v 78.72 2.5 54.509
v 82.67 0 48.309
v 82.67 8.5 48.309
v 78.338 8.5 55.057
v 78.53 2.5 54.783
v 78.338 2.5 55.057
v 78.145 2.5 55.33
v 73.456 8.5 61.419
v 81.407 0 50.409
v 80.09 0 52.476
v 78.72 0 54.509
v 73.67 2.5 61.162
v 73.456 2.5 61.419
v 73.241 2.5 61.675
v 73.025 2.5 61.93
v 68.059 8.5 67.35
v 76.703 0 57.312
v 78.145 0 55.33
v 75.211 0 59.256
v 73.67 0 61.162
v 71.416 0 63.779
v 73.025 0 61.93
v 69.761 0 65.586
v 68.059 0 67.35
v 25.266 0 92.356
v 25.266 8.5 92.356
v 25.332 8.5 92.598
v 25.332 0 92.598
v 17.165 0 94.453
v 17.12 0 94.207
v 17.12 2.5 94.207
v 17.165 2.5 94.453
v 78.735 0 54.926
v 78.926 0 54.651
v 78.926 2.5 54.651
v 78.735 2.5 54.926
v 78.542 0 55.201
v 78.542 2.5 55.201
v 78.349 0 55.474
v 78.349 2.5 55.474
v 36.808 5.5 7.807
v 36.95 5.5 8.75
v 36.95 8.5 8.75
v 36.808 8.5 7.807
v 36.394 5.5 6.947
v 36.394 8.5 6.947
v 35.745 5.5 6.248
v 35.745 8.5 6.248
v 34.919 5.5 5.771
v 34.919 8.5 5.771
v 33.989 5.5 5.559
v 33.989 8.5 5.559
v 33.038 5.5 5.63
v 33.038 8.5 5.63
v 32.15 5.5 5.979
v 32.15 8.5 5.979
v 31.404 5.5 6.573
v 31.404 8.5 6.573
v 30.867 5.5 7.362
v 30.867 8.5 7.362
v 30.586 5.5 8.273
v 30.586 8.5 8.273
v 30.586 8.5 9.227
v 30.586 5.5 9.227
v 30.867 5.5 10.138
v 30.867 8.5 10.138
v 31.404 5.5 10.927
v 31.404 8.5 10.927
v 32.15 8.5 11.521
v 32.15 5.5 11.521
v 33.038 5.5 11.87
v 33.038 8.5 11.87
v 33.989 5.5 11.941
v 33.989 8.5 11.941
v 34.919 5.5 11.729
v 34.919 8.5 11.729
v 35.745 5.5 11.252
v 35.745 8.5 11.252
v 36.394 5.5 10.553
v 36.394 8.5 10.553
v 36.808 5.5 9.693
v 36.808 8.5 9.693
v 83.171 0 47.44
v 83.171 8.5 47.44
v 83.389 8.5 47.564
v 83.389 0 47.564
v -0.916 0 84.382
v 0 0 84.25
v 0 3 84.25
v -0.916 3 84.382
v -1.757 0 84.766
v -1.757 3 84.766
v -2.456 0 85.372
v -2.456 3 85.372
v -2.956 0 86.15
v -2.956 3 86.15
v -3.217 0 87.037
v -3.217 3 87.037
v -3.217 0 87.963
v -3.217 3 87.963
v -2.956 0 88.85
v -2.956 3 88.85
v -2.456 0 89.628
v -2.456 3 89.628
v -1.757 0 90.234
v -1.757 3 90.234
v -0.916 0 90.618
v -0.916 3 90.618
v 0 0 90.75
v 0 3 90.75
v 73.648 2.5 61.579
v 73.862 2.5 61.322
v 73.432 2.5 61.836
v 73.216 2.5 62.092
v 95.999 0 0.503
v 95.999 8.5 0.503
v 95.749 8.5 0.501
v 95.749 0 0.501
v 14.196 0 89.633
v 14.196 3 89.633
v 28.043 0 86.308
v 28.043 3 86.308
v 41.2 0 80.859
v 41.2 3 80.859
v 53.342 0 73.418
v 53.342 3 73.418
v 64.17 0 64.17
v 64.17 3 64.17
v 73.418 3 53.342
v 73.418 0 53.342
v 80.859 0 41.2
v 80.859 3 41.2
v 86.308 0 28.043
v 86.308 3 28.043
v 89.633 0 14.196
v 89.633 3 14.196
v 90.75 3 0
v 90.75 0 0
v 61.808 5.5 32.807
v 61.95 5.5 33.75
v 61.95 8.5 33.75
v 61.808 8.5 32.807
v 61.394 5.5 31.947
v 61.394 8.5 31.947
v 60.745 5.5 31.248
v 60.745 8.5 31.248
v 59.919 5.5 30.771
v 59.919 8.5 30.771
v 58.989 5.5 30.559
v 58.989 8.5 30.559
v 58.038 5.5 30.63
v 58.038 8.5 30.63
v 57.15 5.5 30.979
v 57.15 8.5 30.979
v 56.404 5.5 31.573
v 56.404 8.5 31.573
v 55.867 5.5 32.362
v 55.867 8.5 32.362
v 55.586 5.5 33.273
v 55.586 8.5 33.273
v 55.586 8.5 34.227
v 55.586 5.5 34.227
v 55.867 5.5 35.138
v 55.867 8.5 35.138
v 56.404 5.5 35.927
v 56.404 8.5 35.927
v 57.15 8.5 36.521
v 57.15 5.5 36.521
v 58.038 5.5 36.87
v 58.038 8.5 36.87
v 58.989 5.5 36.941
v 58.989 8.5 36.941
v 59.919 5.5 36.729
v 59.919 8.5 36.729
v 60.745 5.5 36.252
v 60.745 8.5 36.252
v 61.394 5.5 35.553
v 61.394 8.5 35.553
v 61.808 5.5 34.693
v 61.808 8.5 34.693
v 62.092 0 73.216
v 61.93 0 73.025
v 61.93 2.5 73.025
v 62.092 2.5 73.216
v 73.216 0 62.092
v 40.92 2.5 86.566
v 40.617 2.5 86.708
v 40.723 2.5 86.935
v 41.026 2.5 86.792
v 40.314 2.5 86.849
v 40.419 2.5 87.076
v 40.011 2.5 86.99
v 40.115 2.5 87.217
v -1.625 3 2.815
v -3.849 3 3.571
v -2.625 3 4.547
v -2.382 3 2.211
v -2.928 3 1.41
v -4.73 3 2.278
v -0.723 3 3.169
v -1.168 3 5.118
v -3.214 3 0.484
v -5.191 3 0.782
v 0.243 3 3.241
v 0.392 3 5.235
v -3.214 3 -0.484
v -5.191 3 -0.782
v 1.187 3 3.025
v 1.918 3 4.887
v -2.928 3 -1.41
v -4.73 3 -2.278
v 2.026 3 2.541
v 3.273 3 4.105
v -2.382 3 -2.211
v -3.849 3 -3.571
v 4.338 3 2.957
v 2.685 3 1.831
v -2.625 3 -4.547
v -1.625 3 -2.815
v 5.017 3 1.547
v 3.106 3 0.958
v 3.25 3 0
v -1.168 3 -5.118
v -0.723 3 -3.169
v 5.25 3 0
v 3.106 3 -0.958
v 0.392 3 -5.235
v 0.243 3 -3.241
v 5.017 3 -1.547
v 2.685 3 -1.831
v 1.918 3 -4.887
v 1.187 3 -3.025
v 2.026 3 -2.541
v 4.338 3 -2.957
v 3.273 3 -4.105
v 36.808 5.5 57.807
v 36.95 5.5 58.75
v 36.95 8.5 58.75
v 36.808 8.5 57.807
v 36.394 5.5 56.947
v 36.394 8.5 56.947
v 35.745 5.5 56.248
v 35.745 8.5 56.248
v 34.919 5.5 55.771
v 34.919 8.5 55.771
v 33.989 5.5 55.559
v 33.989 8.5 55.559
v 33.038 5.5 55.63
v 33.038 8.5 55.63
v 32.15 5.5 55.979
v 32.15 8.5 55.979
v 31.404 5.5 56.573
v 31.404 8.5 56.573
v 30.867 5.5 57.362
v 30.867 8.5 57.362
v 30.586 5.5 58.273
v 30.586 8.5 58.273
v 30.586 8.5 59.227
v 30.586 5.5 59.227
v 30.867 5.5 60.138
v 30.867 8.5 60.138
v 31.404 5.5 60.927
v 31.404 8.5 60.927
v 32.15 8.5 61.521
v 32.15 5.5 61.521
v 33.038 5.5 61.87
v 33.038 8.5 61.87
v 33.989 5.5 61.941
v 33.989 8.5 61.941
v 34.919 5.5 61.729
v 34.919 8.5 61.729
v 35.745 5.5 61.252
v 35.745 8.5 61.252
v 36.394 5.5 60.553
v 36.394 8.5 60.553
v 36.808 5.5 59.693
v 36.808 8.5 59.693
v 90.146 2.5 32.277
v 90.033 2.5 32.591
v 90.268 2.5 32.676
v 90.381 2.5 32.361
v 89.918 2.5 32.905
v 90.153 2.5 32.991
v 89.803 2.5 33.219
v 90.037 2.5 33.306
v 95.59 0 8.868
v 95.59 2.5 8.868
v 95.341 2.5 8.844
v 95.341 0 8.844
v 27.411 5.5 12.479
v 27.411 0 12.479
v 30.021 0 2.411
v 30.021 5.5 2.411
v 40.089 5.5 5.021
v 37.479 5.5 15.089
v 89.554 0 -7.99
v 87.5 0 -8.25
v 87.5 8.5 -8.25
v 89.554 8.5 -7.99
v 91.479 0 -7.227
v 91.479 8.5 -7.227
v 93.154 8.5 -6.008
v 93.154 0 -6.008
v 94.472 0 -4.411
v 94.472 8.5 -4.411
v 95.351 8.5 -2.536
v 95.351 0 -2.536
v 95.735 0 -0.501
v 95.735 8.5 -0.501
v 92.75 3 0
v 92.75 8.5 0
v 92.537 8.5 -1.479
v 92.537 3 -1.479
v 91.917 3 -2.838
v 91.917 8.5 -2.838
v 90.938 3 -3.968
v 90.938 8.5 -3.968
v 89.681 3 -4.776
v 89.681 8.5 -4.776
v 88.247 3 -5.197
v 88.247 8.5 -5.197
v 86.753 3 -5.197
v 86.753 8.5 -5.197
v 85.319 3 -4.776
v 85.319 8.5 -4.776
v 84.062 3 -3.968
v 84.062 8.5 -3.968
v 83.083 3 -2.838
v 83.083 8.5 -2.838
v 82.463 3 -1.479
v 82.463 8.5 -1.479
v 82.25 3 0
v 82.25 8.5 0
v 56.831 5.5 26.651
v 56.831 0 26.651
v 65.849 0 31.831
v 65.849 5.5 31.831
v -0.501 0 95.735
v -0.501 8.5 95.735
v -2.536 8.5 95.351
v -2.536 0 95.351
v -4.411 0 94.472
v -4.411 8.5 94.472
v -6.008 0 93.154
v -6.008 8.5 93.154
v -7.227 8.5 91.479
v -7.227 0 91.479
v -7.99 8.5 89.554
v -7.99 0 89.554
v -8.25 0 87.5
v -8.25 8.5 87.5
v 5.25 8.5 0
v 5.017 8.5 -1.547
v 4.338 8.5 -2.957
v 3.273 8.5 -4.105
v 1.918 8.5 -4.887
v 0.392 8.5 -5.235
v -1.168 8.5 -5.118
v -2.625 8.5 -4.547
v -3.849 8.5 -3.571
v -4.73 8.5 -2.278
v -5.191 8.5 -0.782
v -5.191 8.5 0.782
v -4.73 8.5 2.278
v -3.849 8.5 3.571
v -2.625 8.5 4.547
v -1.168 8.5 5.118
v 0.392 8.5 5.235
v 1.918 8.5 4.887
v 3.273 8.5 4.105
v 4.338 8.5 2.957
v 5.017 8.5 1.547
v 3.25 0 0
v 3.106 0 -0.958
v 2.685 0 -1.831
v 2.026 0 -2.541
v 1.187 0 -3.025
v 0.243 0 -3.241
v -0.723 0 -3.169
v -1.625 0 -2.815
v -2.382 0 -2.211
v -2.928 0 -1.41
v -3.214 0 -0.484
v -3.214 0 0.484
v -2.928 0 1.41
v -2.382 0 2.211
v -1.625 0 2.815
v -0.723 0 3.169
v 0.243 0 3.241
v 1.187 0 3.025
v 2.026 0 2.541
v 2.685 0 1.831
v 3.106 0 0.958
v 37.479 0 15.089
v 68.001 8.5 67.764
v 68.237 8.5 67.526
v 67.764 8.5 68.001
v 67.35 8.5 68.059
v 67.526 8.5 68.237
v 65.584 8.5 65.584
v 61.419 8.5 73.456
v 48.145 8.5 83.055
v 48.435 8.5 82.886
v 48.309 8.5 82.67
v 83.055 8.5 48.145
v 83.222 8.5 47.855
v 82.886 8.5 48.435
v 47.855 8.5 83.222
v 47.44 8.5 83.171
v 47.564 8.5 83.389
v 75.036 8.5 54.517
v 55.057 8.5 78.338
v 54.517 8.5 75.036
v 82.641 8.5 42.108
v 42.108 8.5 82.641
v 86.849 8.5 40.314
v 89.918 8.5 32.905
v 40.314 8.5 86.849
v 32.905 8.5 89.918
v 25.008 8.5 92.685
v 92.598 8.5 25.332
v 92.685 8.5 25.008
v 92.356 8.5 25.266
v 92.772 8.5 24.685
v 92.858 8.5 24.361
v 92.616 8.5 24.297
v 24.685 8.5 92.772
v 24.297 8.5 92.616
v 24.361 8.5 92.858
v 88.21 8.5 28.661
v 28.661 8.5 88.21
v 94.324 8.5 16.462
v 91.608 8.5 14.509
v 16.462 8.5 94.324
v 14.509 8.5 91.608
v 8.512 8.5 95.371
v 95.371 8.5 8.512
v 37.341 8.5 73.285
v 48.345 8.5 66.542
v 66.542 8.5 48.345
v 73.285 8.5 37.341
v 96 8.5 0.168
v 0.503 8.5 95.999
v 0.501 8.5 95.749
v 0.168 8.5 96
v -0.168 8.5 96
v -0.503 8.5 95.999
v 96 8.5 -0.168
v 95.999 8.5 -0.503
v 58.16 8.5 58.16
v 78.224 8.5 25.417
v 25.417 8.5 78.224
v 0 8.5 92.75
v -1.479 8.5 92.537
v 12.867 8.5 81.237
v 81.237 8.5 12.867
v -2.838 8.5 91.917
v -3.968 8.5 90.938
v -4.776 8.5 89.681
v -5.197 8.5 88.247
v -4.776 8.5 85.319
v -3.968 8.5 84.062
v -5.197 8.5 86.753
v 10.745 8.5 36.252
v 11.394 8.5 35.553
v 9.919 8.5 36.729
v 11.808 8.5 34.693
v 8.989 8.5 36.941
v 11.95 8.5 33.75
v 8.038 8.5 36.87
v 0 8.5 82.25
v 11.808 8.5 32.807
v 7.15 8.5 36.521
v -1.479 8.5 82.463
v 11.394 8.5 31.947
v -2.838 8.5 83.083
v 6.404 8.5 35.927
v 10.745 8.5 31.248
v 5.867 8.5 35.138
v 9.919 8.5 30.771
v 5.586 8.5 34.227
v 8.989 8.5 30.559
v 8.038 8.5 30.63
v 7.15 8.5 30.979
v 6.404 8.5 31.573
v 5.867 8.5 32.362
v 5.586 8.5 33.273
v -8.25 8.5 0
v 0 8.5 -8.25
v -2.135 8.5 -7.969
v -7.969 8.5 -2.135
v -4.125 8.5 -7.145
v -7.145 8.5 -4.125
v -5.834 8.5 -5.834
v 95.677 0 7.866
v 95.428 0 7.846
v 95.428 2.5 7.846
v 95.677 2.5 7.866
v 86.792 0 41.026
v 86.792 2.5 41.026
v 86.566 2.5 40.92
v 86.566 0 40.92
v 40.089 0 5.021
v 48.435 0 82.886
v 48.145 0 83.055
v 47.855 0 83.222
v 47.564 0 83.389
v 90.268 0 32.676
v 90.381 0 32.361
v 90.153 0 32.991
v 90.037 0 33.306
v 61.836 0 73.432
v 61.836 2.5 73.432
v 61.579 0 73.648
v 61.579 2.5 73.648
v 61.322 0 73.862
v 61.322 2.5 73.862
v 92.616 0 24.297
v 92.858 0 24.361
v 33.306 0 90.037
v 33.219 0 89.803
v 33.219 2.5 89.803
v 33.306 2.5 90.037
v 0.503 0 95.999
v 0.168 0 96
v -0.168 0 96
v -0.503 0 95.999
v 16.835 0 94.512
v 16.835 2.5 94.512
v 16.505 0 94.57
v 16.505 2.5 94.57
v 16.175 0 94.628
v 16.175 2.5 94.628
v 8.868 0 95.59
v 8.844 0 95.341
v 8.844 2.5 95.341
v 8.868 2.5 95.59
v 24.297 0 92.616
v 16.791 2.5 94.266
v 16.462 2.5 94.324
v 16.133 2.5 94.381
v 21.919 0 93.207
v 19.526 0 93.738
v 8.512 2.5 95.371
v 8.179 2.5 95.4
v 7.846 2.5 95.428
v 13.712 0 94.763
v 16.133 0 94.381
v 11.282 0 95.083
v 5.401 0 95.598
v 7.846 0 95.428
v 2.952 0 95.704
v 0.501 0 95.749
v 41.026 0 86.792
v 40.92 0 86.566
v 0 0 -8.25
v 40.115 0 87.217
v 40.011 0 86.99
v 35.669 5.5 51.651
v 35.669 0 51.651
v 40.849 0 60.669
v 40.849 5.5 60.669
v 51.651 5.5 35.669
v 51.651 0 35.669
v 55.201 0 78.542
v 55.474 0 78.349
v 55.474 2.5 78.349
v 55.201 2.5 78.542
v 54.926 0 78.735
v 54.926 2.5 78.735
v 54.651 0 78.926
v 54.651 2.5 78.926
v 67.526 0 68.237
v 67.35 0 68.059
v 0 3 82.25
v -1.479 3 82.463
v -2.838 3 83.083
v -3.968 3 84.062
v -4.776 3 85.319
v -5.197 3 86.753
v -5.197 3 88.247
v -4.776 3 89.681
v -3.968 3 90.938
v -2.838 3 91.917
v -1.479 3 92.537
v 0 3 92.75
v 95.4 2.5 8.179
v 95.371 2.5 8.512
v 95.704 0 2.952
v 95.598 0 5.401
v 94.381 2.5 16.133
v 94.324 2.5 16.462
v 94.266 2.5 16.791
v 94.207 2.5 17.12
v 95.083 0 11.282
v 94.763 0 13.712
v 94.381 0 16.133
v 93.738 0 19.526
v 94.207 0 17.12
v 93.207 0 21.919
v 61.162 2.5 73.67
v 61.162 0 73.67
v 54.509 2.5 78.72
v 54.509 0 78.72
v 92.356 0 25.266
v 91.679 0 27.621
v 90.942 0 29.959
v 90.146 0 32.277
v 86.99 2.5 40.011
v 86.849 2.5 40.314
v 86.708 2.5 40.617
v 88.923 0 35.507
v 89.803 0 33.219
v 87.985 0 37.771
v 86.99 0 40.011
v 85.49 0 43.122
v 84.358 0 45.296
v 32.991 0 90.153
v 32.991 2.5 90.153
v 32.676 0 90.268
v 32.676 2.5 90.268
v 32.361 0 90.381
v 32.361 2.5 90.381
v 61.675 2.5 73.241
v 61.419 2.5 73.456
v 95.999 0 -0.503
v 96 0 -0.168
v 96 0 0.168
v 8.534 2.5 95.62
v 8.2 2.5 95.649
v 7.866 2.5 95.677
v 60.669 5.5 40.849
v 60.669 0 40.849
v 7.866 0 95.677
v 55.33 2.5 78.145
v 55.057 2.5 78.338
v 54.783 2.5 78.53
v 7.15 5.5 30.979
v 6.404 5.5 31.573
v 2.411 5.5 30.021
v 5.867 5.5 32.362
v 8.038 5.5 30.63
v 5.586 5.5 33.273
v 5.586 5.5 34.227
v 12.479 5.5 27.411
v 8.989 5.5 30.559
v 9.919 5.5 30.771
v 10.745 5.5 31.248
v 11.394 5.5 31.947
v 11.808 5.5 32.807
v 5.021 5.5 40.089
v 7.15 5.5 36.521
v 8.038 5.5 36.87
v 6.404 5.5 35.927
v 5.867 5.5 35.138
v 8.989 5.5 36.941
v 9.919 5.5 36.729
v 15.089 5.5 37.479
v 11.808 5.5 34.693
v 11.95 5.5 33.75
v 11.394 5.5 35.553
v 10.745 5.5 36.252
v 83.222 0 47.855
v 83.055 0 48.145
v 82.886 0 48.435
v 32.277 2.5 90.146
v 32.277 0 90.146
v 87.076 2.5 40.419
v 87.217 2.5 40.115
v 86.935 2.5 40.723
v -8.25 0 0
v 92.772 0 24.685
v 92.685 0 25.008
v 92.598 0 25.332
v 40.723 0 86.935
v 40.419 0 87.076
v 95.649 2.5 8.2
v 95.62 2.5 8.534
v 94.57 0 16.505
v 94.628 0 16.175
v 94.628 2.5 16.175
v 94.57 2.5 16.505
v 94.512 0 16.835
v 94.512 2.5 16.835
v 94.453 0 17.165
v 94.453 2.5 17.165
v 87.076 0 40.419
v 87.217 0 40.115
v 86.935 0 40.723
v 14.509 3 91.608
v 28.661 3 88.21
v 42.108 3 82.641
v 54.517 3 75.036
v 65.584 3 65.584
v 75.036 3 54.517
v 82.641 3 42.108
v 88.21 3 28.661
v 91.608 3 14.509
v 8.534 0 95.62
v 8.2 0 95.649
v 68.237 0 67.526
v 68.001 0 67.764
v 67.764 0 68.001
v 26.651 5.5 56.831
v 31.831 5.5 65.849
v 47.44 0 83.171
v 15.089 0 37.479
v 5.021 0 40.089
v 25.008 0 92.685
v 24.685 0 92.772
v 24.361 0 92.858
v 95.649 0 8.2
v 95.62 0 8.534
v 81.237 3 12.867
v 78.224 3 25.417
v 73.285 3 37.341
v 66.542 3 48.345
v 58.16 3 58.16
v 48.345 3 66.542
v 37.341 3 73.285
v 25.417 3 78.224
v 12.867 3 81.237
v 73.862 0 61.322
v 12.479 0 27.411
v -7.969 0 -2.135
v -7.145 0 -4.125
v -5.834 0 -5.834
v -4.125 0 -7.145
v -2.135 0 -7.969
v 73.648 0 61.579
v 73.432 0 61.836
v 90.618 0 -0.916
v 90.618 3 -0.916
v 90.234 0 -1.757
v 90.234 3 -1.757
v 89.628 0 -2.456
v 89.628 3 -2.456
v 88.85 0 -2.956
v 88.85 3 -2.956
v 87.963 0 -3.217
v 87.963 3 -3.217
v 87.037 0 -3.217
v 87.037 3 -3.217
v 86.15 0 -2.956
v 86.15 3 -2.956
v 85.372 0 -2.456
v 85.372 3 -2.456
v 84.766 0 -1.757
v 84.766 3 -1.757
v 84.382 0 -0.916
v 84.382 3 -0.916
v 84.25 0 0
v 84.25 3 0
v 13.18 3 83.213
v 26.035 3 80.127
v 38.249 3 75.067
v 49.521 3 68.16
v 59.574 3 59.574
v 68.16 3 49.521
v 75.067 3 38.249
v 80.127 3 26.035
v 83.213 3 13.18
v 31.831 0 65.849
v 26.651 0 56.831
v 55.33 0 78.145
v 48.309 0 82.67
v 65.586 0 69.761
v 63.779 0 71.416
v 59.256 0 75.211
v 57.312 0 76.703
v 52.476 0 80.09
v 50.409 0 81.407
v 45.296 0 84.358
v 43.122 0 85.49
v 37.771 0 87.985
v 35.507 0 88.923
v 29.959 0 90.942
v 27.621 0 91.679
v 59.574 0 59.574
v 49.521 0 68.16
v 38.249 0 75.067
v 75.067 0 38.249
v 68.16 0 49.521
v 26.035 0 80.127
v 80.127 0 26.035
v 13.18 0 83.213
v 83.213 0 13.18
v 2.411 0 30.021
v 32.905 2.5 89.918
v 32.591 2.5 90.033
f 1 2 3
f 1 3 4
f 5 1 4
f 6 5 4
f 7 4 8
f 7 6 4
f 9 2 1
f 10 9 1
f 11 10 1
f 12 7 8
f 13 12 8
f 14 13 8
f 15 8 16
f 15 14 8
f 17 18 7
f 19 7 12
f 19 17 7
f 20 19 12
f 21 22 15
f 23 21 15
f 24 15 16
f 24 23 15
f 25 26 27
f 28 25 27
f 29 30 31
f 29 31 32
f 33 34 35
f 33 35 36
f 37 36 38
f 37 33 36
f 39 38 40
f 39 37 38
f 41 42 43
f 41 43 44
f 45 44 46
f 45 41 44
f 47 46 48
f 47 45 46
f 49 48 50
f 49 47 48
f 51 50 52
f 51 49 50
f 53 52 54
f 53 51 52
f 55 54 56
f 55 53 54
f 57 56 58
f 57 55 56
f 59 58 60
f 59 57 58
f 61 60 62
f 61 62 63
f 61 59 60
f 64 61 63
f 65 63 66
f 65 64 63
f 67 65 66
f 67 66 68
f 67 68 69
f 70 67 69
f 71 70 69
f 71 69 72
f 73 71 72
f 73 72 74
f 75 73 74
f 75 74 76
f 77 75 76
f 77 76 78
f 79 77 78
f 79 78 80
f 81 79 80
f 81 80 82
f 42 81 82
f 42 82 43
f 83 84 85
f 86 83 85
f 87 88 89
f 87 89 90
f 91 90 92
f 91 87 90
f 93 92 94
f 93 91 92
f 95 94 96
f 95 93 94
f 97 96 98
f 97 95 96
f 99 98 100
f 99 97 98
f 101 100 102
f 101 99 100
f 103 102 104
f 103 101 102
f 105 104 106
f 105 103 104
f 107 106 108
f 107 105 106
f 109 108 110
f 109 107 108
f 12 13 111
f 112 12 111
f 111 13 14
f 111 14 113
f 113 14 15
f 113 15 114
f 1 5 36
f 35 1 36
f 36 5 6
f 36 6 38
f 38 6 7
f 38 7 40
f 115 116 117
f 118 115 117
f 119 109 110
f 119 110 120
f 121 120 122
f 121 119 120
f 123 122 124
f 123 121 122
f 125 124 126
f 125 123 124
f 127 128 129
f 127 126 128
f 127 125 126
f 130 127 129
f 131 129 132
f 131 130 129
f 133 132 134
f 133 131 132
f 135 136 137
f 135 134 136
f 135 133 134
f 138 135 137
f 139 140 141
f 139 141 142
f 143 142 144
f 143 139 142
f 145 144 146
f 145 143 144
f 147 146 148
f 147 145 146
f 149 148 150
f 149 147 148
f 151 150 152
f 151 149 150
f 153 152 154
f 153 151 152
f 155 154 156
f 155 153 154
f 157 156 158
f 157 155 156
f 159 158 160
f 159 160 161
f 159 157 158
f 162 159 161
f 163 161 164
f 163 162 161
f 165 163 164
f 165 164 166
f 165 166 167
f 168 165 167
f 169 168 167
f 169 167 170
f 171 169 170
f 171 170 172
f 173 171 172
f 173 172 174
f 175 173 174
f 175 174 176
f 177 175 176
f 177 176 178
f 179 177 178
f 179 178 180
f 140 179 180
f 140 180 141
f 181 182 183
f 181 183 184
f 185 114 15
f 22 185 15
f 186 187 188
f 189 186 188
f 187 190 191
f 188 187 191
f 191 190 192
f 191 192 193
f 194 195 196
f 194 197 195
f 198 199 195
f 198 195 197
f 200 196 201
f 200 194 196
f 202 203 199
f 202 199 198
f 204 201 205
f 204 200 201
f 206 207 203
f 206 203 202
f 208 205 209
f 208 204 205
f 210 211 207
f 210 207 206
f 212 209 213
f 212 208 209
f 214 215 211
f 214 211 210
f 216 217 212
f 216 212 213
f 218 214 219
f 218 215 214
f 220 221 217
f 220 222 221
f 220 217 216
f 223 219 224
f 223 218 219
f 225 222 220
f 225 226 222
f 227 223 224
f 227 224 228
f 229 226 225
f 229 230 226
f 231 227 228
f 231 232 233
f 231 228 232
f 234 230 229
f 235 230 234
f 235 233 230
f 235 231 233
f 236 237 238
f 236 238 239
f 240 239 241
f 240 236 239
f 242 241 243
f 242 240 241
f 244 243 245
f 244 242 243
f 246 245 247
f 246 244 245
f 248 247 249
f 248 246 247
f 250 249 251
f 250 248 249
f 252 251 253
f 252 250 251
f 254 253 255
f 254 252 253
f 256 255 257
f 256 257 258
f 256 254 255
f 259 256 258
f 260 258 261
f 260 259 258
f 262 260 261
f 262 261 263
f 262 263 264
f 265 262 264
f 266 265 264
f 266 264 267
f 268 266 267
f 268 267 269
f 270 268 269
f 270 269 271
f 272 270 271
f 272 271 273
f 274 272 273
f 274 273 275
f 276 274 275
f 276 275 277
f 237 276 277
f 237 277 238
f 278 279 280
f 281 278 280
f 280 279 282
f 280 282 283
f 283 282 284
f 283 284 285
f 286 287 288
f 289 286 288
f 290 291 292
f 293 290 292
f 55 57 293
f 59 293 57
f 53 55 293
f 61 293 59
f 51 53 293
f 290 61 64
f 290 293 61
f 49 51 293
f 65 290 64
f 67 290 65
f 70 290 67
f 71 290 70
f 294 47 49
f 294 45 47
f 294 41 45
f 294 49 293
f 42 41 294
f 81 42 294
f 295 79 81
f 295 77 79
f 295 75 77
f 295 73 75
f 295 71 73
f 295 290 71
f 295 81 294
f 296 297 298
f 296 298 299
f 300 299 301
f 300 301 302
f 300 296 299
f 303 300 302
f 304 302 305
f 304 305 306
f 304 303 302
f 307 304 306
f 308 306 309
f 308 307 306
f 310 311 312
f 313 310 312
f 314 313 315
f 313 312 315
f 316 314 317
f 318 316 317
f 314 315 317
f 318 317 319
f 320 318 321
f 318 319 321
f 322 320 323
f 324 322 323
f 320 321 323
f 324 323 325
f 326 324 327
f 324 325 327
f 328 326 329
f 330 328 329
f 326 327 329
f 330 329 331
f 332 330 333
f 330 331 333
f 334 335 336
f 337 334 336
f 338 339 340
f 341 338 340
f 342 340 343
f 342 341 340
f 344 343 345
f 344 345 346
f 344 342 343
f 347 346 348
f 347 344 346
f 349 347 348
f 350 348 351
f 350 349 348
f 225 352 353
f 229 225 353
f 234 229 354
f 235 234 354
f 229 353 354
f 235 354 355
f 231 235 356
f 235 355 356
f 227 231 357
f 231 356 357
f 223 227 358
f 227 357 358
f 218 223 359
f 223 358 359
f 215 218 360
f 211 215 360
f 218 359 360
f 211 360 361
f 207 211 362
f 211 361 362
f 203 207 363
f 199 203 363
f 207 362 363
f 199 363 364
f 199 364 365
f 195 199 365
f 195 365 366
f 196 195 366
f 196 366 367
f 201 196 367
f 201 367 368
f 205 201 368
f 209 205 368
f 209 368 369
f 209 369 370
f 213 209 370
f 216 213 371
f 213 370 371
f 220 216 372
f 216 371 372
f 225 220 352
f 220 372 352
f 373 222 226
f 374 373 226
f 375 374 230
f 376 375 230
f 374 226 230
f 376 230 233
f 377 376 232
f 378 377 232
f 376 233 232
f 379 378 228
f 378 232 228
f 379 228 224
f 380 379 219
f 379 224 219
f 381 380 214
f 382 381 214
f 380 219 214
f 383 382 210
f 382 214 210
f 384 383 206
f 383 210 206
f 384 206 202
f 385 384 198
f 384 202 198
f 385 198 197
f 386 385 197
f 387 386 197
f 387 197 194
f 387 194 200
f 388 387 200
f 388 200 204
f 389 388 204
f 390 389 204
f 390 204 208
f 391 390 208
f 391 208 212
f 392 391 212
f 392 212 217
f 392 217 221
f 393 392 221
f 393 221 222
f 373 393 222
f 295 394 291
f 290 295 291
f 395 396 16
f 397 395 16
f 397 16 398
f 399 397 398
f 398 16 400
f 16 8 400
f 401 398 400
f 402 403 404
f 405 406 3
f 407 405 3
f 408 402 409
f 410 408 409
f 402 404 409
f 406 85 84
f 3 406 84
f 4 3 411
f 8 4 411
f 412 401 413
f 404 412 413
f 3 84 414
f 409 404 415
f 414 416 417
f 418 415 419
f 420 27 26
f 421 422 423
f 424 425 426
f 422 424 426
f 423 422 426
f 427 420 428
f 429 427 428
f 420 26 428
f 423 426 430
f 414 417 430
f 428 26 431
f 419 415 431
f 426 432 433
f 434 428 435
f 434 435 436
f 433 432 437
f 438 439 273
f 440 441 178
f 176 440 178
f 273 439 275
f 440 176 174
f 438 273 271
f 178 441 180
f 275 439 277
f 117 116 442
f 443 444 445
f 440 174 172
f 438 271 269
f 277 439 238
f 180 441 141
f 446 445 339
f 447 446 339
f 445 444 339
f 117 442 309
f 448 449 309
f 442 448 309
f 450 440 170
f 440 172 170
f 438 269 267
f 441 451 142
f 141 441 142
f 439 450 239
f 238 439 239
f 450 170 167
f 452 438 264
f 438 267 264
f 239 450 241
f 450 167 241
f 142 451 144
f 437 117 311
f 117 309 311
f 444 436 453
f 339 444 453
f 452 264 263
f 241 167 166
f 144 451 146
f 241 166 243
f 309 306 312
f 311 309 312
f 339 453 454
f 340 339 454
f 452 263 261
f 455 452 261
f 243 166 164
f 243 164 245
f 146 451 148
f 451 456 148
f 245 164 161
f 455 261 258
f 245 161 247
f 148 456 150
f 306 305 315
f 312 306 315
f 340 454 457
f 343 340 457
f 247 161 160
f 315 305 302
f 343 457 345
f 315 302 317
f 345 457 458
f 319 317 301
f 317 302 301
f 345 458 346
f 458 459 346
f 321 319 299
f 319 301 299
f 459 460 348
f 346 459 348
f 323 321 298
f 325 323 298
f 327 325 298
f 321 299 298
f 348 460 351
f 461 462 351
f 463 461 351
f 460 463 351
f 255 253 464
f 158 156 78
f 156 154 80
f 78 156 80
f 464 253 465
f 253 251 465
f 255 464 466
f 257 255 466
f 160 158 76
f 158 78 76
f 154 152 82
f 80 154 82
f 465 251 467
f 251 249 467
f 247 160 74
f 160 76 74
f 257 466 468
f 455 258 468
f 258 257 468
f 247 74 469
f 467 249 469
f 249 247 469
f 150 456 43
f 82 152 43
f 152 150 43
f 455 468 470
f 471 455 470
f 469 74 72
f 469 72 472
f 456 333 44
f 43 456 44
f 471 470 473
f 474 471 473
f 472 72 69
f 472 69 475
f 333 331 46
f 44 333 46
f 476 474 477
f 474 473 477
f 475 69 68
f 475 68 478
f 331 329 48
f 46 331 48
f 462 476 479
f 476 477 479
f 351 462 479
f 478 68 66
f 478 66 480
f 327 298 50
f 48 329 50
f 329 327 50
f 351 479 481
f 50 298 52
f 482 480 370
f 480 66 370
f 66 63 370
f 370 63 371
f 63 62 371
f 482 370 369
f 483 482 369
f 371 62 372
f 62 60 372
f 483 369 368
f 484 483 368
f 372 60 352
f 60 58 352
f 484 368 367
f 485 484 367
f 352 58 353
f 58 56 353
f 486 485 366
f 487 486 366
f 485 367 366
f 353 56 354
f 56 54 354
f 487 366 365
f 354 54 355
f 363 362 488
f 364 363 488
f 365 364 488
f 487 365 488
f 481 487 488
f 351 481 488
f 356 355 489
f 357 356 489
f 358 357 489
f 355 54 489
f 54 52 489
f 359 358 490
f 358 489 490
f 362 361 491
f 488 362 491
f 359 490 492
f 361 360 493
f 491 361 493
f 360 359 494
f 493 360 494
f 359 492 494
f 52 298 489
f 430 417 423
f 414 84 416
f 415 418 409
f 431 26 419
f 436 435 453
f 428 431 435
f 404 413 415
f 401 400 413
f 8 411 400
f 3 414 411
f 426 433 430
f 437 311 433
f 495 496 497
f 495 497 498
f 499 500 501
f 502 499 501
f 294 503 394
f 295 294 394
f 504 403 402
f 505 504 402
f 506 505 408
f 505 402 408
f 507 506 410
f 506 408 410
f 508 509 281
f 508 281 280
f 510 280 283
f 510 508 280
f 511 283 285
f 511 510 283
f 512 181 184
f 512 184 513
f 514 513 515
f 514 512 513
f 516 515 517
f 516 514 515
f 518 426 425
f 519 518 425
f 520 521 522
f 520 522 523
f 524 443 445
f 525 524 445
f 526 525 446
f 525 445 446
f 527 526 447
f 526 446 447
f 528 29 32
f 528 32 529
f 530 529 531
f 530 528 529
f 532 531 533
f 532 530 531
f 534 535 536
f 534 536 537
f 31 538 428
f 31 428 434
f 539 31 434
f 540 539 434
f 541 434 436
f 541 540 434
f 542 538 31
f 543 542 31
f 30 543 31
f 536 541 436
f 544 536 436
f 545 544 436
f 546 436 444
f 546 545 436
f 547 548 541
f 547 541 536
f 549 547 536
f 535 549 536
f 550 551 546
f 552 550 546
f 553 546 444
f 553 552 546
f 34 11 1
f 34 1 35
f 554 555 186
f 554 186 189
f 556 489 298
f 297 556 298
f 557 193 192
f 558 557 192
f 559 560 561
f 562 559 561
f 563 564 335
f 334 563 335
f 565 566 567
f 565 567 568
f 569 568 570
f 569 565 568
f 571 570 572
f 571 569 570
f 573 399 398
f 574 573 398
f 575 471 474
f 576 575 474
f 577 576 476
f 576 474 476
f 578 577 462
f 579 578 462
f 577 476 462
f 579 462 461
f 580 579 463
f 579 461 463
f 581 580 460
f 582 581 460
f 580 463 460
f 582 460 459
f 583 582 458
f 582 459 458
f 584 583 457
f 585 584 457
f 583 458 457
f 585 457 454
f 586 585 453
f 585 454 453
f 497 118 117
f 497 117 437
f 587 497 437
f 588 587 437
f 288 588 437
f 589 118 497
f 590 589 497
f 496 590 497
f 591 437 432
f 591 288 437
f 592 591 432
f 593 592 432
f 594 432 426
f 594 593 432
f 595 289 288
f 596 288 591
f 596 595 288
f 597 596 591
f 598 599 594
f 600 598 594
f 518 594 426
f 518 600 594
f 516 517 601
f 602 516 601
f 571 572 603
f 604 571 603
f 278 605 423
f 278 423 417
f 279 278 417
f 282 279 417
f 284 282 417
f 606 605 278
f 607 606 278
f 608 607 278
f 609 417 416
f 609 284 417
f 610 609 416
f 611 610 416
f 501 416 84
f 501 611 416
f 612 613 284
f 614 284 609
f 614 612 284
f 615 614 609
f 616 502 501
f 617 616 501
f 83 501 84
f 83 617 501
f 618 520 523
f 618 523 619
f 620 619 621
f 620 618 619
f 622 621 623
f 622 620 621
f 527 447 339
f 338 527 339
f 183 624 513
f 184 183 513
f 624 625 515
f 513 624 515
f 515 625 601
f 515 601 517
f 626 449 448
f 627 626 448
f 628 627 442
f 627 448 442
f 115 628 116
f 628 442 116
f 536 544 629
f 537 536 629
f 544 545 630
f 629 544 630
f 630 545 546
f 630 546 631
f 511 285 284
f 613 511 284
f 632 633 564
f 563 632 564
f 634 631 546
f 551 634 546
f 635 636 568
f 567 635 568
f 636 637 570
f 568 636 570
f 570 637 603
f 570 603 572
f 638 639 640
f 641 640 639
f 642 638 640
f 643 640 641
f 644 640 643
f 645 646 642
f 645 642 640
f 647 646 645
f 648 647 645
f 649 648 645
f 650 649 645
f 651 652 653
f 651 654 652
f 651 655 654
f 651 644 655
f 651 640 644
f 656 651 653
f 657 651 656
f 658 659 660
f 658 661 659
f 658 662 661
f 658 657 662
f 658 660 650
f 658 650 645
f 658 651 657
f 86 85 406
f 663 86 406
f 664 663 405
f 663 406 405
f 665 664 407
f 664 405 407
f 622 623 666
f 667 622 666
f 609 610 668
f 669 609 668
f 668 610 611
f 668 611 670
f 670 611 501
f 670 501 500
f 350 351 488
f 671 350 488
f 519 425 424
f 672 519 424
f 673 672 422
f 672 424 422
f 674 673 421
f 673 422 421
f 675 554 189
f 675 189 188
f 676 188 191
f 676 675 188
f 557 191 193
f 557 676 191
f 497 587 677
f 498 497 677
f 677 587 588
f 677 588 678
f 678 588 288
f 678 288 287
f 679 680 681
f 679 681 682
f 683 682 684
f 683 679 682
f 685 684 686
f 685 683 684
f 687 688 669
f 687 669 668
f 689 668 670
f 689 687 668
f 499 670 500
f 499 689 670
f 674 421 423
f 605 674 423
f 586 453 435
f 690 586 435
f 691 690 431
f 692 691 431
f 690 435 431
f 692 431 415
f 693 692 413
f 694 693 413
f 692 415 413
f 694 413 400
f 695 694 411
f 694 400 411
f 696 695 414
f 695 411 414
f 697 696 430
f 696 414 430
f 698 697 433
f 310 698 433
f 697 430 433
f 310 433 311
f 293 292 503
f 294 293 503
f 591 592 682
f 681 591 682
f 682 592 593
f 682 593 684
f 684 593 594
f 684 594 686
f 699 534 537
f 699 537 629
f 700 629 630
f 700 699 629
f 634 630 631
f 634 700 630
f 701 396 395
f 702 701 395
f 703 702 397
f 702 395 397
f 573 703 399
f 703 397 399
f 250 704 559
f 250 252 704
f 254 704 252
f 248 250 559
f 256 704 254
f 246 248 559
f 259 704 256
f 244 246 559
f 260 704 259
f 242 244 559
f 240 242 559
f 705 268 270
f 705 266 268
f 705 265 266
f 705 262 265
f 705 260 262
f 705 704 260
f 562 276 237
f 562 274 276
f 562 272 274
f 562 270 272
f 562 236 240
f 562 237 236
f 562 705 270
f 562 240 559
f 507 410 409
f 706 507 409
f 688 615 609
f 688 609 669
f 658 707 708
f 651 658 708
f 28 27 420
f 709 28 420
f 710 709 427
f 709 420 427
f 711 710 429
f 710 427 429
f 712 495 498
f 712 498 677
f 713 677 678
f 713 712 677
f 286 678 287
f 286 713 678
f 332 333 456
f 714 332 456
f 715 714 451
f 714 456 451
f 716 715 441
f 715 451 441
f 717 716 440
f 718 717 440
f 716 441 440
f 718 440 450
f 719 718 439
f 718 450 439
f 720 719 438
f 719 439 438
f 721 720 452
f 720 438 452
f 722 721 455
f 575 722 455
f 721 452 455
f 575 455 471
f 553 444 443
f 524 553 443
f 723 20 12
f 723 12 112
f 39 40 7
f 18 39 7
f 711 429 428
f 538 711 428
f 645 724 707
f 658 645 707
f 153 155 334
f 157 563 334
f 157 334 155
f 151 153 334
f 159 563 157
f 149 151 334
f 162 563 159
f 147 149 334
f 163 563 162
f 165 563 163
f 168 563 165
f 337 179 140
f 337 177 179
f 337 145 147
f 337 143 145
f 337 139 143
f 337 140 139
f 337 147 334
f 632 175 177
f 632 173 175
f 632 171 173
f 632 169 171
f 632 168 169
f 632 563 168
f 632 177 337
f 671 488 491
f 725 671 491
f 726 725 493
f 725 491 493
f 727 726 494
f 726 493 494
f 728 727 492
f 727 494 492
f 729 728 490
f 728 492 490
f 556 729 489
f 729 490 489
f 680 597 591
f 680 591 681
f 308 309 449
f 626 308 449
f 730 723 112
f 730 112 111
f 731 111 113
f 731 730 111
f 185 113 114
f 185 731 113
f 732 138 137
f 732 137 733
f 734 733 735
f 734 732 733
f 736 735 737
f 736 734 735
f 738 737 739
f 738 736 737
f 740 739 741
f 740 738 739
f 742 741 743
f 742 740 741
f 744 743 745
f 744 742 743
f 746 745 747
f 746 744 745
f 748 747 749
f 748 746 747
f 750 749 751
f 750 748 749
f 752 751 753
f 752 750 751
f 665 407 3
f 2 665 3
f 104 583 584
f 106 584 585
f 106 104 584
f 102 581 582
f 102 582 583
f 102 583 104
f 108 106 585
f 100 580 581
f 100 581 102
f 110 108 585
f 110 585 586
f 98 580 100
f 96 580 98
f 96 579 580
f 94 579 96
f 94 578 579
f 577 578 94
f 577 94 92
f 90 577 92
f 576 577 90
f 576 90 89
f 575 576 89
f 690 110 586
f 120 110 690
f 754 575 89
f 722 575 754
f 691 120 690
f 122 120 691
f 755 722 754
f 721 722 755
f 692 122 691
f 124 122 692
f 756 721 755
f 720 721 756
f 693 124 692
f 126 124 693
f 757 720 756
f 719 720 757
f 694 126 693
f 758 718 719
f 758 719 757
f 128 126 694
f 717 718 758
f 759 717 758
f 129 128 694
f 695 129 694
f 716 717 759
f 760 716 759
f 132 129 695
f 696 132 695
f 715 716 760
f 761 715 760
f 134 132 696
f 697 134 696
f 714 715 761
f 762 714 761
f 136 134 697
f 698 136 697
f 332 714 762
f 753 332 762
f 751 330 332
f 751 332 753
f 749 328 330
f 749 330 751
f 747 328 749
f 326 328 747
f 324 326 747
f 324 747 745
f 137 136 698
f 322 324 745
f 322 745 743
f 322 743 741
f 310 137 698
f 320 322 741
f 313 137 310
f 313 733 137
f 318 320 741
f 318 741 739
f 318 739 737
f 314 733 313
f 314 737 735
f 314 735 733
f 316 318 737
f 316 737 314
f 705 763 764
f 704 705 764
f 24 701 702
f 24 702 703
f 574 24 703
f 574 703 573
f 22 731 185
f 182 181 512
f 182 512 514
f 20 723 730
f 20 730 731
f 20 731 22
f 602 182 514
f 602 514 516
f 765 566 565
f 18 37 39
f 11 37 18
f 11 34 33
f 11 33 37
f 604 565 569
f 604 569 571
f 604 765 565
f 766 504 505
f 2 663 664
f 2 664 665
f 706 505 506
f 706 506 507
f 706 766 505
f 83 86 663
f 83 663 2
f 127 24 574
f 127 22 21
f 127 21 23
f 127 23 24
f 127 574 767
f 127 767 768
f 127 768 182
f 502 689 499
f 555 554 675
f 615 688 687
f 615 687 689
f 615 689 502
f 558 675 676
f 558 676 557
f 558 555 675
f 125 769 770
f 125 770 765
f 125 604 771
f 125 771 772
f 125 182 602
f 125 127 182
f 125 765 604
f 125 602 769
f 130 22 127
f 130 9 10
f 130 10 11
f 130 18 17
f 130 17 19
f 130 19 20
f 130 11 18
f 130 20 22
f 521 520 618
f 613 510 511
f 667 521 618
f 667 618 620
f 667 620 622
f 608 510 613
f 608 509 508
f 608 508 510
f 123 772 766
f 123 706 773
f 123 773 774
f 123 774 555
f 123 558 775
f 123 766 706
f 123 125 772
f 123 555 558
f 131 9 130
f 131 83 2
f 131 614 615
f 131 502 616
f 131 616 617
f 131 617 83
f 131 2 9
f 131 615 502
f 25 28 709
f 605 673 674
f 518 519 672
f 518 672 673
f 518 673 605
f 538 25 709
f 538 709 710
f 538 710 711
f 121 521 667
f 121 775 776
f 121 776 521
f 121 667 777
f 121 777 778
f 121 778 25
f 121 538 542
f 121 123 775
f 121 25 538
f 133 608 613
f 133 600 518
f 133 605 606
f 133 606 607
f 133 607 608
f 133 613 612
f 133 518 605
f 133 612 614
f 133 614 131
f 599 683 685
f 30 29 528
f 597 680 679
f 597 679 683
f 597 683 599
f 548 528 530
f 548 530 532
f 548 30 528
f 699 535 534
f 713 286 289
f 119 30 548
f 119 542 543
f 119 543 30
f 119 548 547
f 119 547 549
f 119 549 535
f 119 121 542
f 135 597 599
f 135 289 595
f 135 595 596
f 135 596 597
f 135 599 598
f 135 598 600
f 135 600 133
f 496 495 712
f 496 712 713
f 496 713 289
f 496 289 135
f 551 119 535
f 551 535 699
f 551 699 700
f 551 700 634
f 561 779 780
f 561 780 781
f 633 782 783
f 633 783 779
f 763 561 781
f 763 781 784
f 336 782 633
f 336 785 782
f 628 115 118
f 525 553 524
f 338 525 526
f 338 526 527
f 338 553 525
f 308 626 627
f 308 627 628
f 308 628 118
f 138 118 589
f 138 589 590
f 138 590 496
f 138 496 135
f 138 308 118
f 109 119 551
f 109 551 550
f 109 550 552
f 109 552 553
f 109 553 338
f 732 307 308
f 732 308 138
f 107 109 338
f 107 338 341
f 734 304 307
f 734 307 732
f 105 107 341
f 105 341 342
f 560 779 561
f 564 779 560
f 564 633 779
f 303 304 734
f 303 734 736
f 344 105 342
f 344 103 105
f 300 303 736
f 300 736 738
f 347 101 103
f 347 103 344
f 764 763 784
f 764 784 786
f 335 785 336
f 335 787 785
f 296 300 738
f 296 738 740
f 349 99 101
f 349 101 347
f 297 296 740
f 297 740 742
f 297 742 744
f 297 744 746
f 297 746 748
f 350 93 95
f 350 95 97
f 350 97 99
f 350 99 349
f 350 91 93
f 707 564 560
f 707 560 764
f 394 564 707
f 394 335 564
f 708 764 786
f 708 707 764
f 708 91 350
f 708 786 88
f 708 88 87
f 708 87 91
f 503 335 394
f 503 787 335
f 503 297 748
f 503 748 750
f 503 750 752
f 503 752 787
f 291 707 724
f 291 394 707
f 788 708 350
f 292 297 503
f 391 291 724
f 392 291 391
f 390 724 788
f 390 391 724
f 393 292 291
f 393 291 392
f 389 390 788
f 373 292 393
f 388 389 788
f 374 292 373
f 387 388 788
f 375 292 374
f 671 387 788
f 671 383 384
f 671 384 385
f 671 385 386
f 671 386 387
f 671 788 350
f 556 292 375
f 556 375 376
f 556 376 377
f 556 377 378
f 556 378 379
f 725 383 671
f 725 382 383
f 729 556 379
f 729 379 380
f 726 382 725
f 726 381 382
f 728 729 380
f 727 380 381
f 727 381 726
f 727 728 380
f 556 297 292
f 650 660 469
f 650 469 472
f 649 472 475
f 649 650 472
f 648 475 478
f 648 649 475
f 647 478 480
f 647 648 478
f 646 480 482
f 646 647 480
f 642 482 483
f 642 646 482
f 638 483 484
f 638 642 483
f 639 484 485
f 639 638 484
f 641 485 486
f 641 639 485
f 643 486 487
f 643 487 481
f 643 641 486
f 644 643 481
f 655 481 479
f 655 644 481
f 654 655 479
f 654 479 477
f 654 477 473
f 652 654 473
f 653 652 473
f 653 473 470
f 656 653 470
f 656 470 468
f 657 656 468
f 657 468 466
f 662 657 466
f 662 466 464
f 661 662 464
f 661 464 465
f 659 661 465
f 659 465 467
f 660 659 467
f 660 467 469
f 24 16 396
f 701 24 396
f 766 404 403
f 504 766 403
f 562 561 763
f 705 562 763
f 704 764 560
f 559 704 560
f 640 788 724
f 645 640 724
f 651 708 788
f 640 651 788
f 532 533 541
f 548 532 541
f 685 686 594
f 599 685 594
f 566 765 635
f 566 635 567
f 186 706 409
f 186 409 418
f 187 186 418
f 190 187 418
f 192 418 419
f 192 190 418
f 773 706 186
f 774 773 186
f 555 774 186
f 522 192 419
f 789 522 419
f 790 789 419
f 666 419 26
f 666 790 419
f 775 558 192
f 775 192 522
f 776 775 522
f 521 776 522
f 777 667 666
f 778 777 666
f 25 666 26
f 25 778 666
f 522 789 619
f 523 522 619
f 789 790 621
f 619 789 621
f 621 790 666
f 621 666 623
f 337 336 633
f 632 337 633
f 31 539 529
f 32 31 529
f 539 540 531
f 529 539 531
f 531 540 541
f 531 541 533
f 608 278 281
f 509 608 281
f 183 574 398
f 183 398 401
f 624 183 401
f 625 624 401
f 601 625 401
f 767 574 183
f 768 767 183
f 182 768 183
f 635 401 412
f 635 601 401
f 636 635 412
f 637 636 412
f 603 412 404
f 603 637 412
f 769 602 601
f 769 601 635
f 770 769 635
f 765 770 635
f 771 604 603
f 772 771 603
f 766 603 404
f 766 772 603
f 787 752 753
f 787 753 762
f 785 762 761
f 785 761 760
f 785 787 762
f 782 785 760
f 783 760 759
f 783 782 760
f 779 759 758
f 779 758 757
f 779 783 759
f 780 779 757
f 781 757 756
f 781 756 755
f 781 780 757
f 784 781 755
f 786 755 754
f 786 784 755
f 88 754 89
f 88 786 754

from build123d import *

# Parameters (mm, degrees)
SKETCH_1_R               = 3.2
EXTRUDE_1_DEPTH          = 8.5
EXTRUDE_2_DEPTH          = 8.5
PATTERN_CIRCULAR_1_COUNT = 7
PATTERN_CIRCULAR_1_ANGLE = 90
EXTRUDE_3_DEPTH          = 2.5
PATTERN_CIRCULAR_2_COUNT = 19
PATTERN_CIRCULAR_2_ANGLE = 90
CUT_EXTRUDE_1_DEPTH      = 5.5
CUT_EXTRUDE_2_DEPTH      = 5.5
EXTRUDE_4_DEPTH          = 8.5
SKETCH_10_R              = 3.25
CUT_EXTRUDE_3_DEPTH      = 8.5
SKETCH_11_R              = 5.25
CUT_EXTRUDE_4_DEPTH      = 5.5


with BuildPart() as part:
    # 스케치1 → 보스-돌출1 (new body)
    with BuildSketch(Plane(origin=(0, 0, 0), x_dir=(1, 0, 0), z_dir=(0, 1, 0))):
        with BuildLine():
            Line((-8.25, -87.5), (-8.25, -22.5))
            ThreePointArc((-8.25, -22.5), (-5.833630945, -16.666369055), (0, -14.25))
            ThreePointArc((0, -14.25), (10.076271632, -10.076271632), (14.25, 0))
            ThreePointArc((14.25, 0), (16.666369055, 5.833630945), (22.5, 8.25))
            Line((22.5, 8.25), (87.5, 8.25))
            ThreePointArc((87.5, 8.25), (93.333630945, 5.833630945), (95.75, 0))
            ThreePointArc((95.75, 0), (67.705474299, -67.705474299), (0, -95.75))
            ThreePointArc((0, -95.75), (-5.833630945, -93.333630945), (-8.25, -87.5))
        make_face()
        with Locations((58.75, -33.75)):
            Circle(SKETCH_1_R, mode=Mode.SUBTRACT)
        with Locations((33.75, -58.75)):
            Circle(SKETCH_1_R, mode=Mode.SUBTRACT)
        with Locations((8.75, -33.75)):
            Circle(SKETCH_1_R, mode=Mode.SUBTRACT)
        with Locations((33.75, -8.75)):
            Circle(SKETCH_1_R, mode=Mode.SUBTRACT)
        with BuildLine():
            ThreePointArc((0, -19.25), (-3.25, -22.5), (0, -25.75))
            ThreePointArc((0, -25.75), (18.207999616, -18.207999616), (25.75, 0))
            ThreePointArc((25.75, 0), (22.5, 3.25), (19.25, 0))
            ThreePointArc((19.25, 0), (13.611805538, -13.611805538), (0, -19.25))
        make_face(mode=Mode.SUBTRACT)
        with BuildLine():
            ThreePointArc((0, -84.25), (-3.25, -87.5), (0, -90.75))
            ThreePointArc((0, -90.75), (64.169940393, -64.169940393), (90.75, 0))
            ThreePointArc((90.75, 0), (87.5, 3.25), (84.25, 0))
            ThreePointArc((84.25, 0), (59.573746315, -59.573746315), (0, -84.25))
        make_face(mode=Mode.SUBTRACT)
    extrude(amount=EXTRUDE_1_DEPTH)

    # 스케치2 → 보스-돌출2 (add)
    with BuildSketch(Plane(origin=(0, 8.5, 0), x_dir=(1, 0, 0), z_dir=(0, 1, 0))):
        with BuildLine():
            Line((0.497416564, -94.998697764), (0.502652528, -95.998684056))
            ThreePointArc((0.502652528, -95.998684056), (0, -96), (-0.502652528, -95.998684056))
            Line((-0.502652528, -95.998684056), (-0.497416564, -94.998697764))
            ThreePointArc((-0.497416564, -94.998697764), (0, -95), (0.497416564, -94.998697764))
        make_face()
    extrude_2 = extrude(amount=-EXTRUDE_2_DEPTH)

    # 원형 패턴1: 보스-돌출2 ×7 about axis
    pattern_circular_1_axis = Axis((0, 0, 0), (0, 1, 0))
    for i in range(1, PATTERN_CIRCULAR_1_COUNT):
        add(extrude_2.rotate(pattern_circular_1_axis, i * PATTERN_CIRCULAR_1_ANGLE / (PATTERN_CIRCULAR_1_COUNT - 1)))

    # 스케치6 → 보스-돌출3 (add)
    with BuildSketch(Plane.XZ):
        with BuildLine():
            Line((95.998684056, 0.502652528), (95.49869091, 0.500034546))
            ThreePointArc((95.49869091, 0.500034546), (95.5, 0), (95.49869091, -0.500034546))
            Line((95.49869091, -0.500034546), (95.998684056, -0.502652528))
            ThreePointArc((95.998684056, -0.502652528), (96, 0), (95.998684056, 0.502652528))
        make_face()
    extrude_3 = extrude(amount=-EXTRUDE_3_DEPTH)

    # 원형 패턴2: 보스-돌출3 ×19 about axis
    pattern_circular_2_axis = Axis((0, 8.5, 0), (0, -1, 0))
    for i in range(1, PATTERN_CIRCULAR_2_COUNT):
        add(extrude_3.rotate(pattern_circular_2_axis, i * PATTERN_CIRCULAR_2_ANGLE / (PATTERN_CIRCULAR_2_COUNT - 1)))

    # 스케치7 → 컷-돌출1 (cut)
    with BuildSketch(Plane.XZ):
        Polygon((26.650803984, 56.831298374), (35.668701626, 51.650803984), (40.849196016, 60.668701626), (31.831298374, 65.849196016), align=None)
        Polygon((51.650803984, 35.668701626), (56.831298374, 26.650803984), (65.849196016, 31.831298374), (60.668701626, 40.849196016), align=None)
        Polygon((30.021419355, 2.411412904), (40.088587096, 5.021419355), (37.478580645, 15.088587096), (27.411412904, 12.478580645), align=None)
        Polygon((2.411412904, 30.021419355), (12.478580645, 27.411412904), (15.088587096, 37.478580645), (5.021419355, 40.088587096), align=None)
    extrude(amount=-CUT_EXTRUDE_1_DEPTH, mode=Mode.SUBTRACT)

    # 스케치8 → 컷-돌출2 (cut)
    with BuildSketch(Plane(origin=(0, 8.5, 0), x_dir=(1, 0, 0), z_dir=(0, 1, 0))):
        with BuildLine():
            ThreePointArc((27.75, 0), (22.5, 5.25), (17.25, 0))
            ThreePointArc((17.25, 0), (12.197591975, -12.197591975), (0, -17.25))
            ThreePointArc((0, -17.25), (-5.25, -22.5), (0, -27.75))
            ThreePointArc((0, -27.75), (19.622213178, -19.622213178), (27.75, 0))
        make_face()
        with BuildLine():
            ThreePointArc((92.75, 0), (87.5, 5.25), (82.25, 0))
            ThreePointArc((82.25, 0), (58.159532753, -58.159532753), (0, -82.25))
            ThreePointArc((0, -82.25), (-5.25, -87.5), (0, -92.75))
            ThreePointArc((0, -92.75), (65.584153955, -65.584153955), (92.75, 0))
        make_face()
    extrude(amount=-CUT_EXTRUDE_2_DEPTH, mode=Mode.SUBTRACT)

    # 스케치9 → 보스-돌출4 (add)
    with BuildSketch(Plane(origin=(0, 8.5, 0), x_dir=(1, 0, 0), z_dir=(0, 1, 0))):
        with BuildLine():
            Line((-8.25, -22.5), (-8.25, 0))
            ThreePointArc((-8.25, 0), (-5.833630945, 5.833630945), (0, 8.25))
            Line((0, 8.25), (22.5, 8.25))
            Line((22.5, 8.25), (27.75, 8.25))
            Line((27.75, 8.25), (27.75, 0))
            ThreePointArc((27.75, 0), (19.622213178, -19.622213178), (0, -27.75))
            Line((0, -27.75), (-8.25, -27.75))
            Line((-8.25, -27.75), (-8.25, -22.5))
        make_face()
    extrude(amount=-EXTRUDE_4_DEPTH)

    # 스케치10 → 컷-돌출3 (cut)
    with BuildSketch(Plane(origin=(0, 8.5, 0), x_dir=(1, 0, 0), z_dir=(0, 1, 0))):
        Circle(SKETCH_10_R)
    extrude(amount=-CUT_EXTRUDE_3_DEPTH, mode=Mode.SUBTRACT)

    # 스케치11 → 컷-돌출4 (cut)
    with BuildSketch(Plane(origin=(0, 8.5, 0), x_dir=(1, 0, 0), z_dir=(0, 1, 0))):
        Circle(SKETCH_11_R)
    extrude(amount=-CUT_EXTRUDE_4_DEPTH, mode=Mode.SUBTRACT)


solid = part.part
